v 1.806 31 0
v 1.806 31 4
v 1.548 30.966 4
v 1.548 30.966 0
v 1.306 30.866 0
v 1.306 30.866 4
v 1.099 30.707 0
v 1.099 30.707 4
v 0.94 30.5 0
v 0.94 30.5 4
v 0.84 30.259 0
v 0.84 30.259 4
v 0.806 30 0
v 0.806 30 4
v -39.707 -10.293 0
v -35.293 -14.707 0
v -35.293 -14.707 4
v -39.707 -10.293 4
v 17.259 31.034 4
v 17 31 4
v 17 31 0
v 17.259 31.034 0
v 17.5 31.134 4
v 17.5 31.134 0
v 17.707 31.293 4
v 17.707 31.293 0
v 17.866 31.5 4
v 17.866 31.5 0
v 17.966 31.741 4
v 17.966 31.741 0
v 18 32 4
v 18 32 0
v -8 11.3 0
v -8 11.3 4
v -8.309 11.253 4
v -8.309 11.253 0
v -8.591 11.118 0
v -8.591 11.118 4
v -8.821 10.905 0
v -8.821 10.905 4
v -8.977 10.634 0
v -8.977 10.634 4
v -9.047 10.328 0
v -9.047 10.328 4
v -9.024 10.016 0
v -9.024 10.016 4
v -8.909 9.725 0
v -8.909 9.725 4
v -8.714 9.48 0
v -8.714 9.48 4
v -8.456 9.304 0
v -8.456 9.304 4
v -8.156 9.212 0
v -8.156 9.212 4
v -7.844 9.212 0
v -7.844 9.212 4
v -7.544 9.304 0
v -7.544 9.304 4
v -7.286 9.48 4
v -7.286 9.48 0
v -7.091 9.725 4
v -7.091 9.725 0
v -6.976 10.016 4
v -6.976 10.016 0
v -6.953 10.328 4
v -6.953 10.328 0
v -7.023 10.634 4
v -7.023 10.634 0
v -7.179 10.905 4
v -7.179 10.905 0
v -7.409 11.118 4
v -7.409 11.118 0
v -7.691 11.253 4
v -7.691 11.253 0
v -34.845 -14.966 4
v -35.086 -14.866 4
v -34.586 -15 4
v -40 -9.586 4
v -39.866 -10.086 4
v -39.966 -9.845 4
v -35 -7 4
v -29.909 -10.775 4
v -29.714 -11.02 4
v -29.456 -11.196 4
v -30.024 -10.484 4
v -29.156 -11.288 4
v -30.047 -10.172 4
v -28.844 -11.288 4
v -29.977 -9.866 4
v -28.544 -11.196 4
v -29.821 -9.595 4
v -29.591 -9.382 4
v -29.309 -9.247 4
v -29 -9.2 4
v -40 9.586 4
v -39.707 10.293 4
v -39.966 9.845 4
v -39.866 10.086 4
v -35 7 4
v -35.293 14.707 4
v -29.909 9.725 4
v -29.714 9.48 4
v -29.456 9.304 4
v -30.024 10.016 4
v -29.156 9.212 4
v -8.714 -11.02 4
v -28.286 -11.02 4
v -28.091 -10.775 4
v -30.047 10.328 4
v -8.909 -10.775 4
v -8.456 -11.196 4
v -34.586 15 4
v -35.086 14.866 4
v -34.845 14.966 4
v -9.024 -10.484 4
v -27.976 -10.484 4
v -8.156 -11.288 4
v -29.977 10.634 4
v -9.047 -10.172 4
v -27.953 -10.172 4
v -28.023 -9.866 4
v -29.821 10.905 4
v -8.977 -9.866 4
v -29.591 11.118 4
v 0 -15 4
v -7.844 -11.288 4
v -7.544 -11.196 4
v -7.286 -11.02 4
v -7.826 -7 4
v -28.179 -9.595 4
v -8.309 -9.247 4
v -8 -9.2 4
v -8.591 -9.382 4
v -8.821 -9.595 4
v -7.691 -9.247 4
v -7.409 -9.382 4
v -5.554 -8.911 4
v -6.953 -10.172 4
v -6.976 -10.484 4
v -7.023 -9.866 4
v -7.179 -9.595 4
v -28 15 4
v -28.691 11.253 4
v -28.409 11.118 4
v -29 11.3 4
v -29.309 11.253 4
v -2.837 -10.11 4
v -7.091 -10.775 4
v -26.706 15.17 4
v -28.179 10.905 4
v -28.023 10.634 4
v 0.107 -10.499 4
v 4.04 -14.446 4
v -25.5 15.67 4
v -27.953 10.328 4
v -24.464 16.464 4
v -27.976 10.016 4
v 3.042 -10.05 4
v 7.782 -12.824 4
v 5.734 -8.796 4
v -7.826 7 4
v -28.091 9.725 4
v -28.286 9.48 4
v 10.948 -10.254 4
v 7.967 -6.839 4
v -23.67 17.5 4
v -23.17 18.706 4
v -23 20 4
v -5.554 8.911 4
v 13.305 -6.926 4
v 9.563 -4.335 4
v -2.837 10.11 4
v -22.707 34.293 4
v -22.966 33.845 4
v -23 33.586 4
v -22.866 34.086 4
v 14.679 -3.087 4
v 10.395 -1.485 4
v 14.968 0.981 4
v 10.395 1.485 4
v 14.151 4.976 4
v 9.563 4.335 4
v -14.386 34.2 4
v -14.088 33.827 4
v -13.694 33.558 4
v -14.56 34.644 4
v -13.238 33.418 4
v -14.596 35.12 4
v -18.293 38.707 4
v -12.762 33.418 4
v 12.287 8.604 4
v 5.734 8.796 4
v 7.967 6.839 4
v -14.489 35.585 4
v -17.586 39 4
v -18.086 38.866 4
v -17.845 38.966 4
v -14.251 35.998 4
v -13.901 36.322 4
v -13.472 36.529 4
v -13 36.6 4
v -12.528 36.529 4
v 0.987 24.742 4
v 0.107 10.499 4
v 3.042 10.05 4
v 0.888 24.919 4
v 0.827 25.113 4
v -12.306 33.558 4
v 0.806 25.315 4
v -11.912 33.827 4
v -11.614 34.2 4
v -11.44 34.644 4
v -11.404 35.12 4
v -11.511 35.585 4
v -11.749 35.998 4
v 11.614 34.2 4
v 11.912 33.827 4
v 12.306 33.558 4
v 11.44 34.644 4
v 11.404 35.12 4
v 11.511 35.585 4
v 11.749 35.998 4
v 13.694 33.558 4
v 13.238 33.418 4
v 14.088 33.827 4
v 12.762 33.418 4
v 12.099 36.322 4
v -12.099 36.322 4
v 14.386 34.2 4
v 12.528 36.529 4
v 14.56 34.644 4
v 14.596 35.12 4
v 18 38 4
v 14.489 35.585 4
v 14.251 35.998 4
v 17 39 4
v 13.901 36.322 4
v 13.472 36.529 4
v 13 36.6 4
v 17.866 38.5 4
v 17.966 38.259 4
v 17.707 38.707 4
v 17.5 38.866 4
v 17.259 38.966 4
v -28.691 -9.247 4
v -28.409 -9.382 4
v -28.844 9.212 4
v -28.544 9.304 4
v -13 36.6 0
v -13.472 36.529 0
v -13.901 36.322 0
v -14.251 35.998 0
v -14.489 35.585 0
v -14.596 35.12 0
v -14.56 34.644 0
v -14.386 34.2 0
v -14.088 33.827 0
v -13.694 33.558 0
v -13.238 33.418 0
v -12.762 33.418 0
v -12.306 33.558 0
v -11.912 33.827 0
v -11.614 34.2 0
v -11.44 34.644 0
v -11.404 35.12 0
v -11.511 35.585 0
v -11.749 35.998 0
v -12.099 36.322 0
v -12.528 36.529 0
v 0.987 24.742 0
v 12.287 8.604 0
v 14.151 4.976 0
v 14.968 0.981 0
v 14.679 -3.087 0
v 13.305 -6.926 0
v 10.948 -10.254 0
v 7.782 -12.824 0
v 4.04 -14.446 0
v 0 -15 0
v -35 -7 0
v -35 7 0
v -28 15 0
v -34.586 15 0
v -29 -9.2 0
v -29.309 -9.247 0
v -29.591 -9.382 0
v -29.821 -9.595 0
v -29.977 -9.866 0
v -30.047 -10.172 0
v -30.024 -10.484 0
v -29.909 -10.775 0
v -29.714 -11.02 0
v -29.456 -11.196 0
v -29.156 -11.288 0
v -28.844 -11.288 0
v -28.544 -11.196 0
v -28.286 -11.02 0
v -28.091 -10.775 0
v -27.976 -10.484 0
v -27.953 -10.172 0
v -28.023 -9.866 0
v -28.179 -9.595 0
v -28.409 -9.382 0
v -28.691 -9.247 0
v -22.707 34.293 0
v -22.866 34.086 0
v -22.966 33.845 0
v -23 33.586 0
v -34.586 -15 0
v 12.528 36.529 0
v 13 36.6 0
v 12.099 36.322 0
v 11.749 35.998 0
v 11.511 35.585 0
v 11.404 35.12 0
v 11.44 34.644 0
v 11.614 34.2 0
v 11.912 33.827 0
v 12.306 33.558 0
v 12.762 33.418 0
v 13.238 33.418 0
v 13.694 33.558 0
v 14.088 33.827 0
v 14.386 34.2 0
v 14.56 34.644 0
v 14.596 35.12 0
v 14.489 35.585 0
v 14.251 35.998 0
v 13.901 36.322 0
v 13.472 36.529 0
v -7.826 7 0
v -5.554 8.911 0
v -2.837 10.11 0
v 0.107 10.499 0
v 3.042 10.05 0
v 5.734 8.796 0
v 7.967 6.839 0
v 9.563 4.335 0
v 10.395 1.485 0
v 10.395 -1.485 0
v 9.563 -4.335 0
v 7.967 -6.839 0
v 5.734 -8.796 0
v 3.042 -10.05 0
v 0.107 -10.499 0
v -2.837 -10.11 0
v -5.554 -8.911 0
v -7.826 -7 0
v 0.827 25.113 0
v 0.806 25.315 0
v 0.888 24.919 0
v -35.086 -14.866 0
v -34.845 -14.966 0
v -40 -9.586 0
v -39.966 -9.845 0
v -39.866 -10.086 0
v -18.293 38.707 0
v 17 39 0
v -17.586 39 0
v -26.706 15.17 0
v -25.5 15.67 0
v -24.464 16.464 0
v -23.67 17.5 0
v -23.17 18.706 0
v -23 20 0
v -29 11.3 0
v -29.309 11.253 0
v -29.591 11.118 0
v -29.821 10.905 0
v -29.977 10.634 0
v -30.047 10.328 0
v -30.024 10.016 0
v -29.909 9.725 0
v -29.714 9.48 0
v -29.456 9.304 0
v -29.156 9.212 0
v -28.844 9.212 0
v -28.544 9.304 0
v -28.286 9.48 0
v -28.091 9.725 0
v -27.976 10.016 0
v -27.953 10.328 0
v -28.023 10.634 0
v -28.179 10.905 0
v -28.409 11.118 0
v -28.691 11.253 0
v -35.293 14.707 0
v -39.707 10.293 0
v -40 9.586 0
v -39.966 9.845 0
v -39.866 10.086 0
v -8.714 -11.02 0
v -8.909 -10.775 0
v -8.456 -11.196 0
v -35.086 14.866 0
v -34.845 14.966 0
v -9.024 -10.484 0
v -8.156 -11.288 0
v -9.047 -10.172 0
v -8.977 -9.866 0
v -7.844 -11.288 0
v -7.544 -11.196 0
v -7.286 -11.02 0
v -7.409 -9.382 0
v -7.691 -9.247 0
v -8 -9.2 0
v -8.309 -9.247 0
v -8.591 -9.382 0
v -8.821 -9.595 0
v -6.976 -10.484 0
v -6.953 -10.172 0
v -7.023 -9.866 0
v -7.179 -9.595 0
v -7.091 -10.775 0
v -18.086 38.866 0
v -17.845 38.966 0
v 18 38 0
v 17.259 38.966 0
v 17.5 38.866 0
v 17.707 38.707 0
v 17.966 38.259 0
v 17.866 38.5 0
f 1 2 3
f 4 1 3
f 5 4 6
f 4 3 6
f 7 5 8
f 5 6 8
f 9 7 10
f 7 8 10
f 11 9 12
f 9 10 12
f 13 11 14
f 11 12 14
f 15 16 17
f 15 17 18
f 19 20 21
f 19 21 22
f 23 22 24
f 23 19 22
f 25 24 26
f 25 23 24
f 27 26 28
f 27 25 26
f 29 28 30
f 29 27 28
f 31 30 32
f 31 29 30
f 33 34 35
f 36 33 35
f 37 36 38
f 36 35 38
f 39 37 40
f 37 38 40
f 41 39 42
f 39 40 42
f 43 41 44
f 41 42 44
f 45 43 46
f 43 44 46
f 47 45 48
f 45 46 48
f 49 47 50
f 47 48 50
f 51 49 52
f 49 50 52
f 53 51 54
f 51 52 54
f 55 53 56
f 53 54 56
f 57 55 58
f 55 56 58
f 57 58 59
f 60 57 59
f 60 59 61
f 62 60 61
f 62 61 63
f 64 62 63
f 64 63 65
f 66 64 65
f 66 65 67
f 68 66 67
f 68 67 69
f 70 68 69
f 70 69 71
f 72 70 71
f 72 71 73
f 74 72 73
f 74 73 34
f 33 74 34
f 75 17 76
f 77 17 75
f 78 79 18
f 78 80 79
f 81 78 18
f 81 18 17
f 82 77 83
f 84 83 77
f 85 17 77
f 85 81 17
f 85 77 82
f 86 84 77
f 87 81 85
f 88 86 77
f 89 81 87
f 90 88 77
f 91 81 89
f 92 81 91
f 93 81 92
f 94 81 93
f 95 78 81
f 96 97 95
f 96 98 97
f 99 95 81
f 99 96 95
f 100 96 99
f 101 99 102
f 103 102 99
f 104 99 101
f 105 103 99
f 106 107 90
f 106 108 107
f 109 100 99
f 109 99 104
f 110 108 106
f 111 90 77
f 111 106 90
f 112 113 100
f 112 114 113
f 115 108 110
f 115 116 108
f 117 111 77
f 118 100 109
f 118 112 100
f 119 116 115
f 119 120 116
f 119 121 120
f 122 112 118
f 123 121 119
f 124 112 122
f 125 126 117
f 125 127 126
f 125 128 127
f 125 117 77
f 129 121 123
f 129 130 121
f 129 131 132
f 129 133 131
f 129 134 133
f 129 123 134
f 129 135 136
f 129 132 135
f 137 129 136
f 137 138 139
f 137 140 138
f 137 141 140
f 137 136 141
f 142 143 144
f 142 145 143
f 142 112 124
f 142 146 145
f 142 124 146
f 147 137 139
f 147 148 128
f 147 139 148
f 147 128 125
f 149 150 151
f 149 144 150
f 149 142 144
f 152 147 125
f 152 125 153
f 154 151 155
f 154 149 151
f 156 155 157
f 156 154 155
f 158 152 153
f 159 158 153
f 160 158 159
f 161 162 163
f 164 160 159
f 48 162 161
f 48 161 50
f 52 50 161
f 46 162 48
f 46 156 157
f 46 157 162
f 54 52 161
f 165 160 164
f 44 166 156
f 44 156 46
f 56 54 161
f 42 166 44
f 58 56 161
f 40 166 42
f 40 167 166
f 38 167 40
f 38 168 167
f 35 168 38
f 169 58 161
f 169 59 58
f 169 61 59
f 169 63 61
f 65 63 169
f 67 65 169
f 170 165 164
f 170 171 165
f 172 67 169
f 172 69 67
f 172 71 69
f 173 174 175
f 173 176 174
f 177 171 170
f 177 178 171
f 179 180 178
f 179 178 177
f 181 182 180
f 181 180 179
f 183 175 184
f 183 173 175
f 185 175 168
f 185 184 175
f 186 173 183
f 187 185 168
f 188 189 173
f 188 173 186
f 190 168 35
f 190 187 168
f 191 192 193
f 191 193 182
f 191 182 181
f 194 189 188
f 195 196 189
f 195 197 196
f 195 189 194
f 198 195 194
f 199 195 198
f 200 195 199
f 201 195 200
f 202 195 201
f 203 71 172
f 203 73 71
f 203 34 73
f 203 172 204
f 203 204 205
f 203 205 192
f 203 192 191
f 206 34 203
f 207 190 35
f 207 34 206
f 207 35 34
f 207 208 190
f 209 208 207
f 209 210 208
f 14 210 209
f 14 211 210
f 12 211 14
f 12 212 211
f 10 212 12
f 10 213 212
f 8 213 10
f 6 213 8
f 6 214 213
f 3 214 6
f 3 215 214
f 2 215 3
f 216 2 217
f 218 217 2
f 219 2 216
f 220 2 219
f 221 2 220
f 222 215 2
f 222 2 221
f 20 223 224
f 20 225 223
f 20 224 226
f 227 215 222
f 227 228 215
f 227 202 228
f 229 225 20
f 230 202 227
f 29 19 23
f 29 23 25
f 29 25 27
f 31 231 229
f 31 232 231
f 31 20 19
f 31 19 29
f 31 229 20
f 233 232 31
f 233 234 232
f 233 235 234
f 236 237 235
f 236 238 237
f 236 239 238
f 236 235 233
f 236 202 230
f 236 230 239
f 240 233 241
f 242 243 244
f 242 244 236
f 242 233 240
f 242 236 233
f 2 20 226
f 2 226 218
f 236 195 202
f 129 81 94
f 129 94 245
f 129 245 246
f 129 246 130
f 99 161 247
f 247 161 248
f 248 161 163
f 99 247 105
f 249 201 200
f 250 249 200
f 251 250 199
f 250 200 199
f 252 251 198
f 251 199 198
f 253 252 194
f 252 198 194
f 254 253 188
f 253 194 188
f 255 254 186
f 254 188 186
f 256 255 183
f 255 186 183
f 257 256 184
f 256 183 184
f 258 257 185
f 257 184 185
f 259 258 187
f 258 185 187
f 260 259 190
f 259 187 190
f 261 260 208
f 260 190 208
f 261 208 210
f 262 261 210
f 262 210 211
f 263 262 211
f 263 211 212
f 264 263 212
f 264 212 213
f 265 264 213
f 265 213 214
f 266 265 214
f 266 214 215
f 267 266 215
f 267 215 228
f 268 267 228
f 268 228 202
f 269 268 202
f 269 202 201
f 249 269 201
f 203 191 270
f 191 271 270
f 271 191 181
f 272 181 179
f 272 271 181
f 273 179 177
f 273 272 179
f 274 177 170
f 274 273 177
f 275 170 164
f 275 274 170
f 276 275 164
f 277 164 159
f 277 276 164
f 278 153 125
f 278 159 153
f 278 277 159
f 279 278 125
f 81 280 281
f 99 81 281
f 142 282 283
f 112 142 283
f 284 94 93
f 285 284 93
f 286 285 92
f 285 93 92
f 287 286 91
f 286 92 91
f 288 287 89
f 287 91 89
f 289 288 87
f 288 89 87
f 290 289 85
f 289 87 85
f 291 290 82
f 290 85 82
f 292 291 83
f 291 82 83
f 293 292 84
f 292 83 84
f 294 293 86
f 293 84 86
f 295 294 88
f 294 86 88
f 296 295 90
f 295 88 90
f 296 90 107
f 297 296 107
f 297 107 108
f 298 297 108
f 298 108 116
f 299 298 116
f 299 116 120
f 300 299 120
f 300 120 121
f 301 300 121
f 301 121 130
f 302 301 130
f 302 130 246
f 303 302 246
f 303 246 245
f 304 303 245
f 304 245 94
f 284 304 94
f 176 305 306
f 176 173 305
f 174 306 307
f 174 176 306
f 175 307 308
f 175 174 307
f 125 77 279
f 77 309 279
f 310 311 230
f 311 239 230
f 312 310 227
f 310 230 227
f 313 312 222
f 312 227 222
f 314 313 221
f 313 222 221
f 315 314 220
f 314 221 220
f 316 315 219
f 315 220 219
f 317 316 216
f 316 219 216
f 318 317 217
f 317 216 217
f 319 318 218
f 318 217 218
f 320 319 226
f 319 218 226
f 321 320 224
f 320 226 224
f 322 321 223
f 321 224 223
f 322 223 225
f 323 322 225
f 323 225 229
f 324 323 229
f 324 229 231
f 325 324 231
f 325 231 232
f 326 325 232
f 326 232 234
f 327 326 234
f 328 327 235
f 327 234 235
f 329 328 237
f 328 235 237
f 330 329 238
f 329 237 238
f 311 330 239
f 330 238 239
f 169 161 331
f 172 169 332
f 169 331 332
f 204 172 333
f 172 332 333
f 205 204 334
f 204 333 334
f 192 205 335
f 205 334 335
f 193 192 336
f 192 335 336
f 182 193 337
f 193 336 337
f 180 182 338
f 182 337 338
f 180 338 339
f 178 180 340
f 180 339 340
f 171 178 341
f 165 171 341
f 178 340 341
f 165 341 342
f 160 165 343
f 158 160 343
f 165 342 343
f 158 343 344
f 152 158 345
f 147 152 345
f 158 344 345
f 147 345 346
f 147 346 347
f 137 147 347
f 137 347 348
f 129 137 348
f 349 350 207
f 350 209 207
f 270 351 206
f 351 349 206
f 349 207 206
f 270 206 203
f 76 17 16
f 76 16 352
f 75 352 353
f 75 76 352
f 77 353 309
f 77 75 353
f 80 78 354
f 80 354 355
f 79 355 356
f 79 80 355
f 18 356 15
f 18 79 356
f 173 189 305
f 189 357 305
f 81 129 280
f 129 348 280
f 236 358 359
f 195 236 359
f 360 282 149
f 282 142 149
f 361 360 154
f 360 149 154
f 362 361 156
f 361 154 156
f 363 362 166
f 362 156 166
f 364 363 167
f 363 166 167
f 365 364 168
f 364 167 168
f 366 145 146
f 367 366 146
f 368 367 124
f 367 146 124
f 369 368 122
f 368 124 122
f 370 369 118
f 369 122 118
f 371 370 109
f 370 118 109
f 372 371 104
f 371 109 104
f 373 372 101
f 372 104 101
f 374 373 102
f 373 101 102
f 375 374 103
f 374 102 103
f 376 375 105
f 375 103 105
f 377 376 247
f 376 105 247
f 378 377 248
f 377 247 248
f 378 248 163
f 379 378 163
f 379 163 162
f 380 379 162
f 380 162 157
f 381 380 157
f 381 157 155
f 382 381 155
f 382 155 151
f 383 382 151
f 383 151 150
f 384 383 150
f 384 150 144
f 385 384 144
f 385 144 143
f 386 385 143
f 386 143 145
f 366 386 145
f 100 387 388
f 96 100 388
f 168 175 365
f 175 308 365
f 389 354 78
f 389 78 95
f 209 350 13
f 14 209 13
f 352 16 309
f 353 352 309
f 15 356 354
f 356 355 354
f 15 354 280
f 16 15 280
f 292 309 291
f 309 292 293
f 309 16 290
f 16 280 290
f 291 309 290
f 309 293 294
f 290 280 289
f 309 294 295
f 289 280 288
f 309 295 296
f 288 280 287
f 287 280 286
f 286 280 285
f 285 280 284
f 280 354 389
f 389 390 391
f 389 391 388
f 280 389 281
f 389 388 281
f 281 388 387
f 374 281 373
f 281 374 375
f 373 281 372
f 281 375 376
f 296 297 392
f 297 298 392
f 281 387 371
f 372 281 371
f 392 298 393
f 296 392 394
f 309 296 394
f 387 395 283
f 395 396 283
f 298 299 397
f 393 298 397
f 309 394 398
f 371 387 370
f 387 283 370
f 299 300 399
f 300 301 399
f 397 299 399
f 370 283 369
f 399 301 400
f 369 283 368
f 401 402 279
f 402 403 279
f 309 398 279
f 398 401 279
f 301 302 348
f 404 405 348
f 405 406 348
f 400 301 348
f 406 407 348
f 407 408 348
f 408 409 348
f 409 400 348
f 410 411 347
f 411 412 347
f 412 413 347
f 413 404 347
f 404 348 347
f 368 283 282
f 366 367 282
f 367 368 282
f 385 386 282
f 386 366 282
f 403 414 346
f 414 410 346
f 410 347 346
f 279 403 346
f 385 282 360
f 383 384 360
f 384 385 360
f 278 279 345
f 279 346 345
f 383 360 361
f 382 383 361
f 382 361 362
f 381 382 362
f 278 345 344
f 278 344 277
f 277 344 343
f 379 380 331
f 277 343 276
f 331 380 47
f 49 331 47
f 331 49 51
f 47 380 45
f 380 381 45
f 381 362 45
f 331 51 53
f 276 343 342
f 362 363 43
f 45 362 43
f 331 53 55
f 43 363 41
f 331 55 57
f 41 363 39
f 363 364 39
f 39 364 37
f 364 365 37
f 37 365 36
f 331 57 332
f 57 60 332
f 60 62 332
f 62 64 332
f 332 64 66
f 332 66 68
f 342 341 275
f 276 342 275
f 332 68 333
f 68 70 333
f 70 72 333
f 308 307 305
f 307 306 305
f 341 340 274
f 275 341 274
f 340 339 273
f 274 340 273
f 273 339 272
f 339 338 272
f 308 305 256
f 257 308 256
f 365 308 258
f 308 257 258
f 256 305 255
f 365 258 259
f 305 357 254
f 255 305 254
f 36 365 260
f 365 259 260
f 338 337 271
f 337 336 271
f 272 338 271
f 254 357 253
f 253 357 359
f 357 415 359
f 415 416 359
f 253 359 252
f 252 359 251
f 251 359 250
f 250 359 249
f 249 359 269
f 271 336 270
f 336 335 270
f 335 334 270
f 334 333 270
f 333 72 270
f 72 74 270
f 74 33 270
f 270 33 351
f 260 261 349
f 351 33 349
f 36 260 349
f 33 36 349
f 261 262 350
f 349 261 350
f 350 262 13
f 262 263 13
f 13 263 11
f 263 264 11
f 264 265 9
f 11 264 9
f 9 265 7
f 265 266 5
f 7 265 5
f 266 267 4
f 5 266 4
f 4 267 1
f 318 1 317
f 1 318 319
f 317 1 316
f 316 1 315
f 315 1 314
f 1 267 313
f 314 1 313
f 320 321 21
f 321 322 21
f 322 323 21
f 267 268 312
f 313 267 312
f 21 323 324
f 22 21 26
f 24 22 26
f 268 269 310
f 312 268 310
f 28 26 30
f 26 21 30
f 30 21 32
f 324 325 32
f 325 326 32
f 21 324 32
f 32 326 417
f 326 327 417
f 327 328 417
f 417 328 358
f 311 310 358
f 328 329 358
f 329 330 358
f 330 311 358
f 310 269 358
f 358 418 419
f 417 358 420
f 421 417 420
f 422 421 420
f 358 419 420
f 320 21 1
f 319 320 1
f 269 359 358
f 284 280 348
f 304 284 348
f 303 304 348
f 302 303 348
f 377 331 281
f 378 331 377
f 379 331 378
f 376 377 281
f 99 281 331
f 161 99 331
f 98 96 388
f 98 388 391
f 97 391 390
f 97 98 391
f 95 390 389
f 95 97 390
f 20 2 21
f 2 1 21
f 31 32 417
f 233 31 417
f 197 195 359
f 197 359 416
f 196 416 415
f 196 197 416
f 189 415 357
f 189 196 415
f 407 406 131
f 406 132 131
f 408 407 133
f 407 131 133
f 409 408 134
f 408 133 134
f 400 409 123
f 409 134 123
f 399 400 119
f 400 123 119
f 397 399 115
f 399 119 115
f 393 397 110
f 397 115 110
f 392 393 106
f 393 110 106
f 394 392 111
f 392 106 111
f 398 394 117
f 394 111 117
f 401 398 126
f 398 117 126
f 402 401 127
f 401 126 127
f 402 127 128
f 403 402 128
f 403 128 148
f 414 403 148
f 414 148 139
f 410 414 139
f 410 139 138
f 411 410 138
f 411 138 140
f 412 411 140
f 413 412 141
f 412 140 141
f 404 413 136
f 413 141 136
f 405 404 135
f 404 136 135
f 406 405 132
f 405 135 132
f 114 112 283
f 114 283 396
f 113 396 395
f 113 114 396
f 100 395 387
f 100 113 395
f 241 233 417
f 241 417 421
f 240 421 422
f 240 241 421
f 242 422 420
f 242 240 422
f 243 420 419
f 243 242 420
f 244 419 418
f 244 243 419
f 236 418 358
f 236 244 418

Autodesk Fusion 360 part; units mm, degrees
sketch "スケッチ1" plane through (0, 0, 0) normal (0, 0, 1) x (1, 0, 0)
  line L0 (-35, -15) -> (0, -15)
  circle A0 centre (0, 0) radius 15
  line L1 (12.2873, 8.6036) -> (0.8064, 25)
  circle A1 centre (0, 0) radius 10.5
  line L2 (-29, 10.25) -> (-8, 10.25)
  line L3 (-8, 10.25) -> (-8, -10.25)
  line L4 (-8, -10.25) -> (-29, -10.25)
  line L5 (-29, -10.25) -> (-29, 10.25)
  line L6 (-13, 35) -> (13, 35)
  line L7 (-35, -15) -> (-40, -10)
  line L8 (-40, -10) -> (-40, 10)
  line L9 (-23, 15) -> (-35, 15)
  line L10 (-35, 15) -> (-40, 10)
  line L11 (0.8064, 25) -> (0.8064, 31)
  line L12 (0.8064, 31) -> (18, 31)
  line L13 (18, 31) -> (18, 39)
  line L14 (18, 39) -> (-18, 39)
  line L15 (-18, 39) -> (-23, 34)
  line L16 (-23, 34) -> (-23, 15)
  line L17 (-35, 7) -> (-7.8262, 7)
  line L18 (-7.8262, 7) -> (-7.8262, -7)
  line L19 (-7.8262, -7) -> (-35, -7)
  line L20 (-35, -7) -> (-35, 7)
  point P0 (-8, 0)
  point P1 (-11.5, 0)
  point P2 (-29.7, 0)
  point P3 (18, 35)
  point P4 (-7.8262, 0)
  dimension "d1" = 30
  dimension "d2" = 55
  dimension "d3" = 35
  dimension "d6" = 21
  dimension "d7" = 8
  dimension "d8" = 21
  dimension "d9" = 20.5
  dimension "d28" = 26
  dimension "d35" = 5
  dimension "d36" = 5
  dimension "d64" = 25
  dimension "d65" = 6
  dimension "d66" = 8
  dimension "d67" = 18
  dimension "d68" = 5
  dimension "d71" = 5
  dimension "d72" = 5
  dimension "d74" = 5
  dimension "d75" = 5
  dimension "d76" = 5
  dimension "d82" = 35
  dimension "d83" = 20
  dimension "d84" = 14
extrude "押し出し1" add sketch "スケッチ1" along normal blind 4 contours L0 A0 L1 L2 L4 L5 L7 L8 L9 L10 L11 L12 L13 L14 L15 L16 L17 L19 L20 | A0 A1 L2 L3 L4 L17 L19 | A0 L4 L5 L19 | A0 L3 L4 L19 | A0 L2 L3 L17 | A0 L2 L5 L17
hole "穴1" at (-8, 10.25, 0) at (-8, -10.25, 0) at (-29, -10.25, 0) at (-29, 10.25, 0) direction (0, 0, 1) diameter 2.1 depth 10 tip angle 118
hole "穴3" at (-13, 35, 0) at (13, 35, 0) direction (0, 0, 1) diameter 3.2 depth 10 tip angle 118
fillet "フィレット4" radius 1 10 edges at (-35, -15, 2) (-40, -10, 2) (-40, 10, 2) (-35, 15, 2) (-23, 34, 2) (-18, 39, 2) (18, 39, 2) (18, 31, 2) (0.8064, 25, 2) (0.8064, 31, 2)
fillet "フィレット5" radius 5 1 edges at (-23, 15, 2)
